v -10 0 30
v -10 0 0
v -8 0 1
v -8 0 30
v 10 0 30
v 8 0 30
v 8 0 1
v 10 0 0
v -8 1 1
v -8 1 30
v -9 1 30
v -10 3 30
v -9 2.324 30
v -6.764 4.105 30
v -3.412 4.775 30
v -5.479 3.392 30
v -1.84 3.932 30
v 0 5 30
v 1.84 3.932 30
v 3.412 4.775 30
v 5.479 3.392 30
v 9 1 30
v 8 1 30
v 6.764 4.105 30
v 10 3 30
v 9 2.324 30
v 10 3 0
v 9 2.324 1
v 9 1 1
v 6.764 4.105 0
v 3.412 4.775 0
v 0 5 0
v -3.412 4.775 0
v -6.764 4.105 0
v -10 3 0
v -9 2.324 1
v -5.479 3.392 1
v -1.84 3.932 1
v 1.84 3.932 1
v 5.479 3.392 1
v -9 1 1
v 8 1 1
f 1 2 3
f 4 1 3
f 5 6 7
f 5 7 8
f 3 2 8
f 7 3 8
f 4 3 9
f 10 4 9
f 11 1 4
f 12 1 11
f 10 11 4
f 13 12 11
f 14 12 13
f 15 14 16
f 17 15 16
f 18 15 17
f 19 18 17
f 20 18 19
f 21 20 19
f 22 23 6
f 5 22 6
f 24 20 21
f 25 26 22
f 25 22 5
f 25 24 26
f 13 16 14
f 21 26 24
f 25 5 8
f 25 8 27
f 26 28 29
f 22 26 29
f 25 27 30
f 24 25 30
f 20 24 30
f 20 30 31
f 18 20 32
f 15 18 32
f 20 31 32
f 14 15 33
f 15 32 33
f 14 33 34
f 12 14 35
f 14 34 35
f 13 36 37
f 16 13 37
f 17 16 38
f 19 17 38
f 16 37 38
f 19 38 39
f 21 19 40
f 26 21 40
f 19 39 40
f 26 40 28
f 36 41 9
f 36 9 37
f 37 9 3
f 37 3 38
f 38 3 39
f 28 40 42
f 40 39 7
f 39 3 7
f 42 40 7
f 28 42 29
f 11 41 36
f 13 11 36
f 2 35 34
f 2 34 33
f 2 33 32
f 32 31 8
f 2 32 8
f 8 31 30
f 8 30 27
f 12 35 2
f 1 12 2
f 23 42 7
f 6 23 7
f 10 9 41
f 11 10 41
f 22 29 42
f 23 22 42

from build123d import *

# Parameters (mm, degrees)
F1_DEPTH = 30
F3_DEPTH = 1


with BuildPart() as f1:
    # F0 (on Top) → F1 (new body)
    with BuildSketch(Plane.XY):
        with BuildLine():
            Line((-10, 3), (-10, 0))
            Line((-10, 0), (-8, 0))
            Line((-8, 0), (-8, 1))
            Line((-8, 1), (-9, 1))
            Line((-9, 1), (-9, 2.323808))
            ThreePointArc((-9, 2.323808), (0, 4), (9, 2.323808))
            Line((9, 2.323808), (9, 1))
            Line((9, 1), (8, 1))
            Line((8, 1), (8, 0))
            Line((8, 0), (10, 0))
            Line((10, 0), (10, 3))
            ThreePointArc((10, 3), (0, 5), (-10, 3))
        make_face()
    extrude(amount=F1_DEPTH)

    # F2 (on face) → F3 (join)
    with BuildSketch(Plane(origin=(0, 0, 0), x_dir=(1, 0, 0), z_dir=(0, 0, -1))):
        with BuildLine():
            Line((10, 0), (-10, 0))
            Line((-10, 0), (-10, -3))
            ThreePointArc((-10, -3), (0, -5), (10, -3))
            Line((10, -3), (10, 0))
        make_face()
    extrude(amount=-F3_DEPTH)


solid = f1.part
